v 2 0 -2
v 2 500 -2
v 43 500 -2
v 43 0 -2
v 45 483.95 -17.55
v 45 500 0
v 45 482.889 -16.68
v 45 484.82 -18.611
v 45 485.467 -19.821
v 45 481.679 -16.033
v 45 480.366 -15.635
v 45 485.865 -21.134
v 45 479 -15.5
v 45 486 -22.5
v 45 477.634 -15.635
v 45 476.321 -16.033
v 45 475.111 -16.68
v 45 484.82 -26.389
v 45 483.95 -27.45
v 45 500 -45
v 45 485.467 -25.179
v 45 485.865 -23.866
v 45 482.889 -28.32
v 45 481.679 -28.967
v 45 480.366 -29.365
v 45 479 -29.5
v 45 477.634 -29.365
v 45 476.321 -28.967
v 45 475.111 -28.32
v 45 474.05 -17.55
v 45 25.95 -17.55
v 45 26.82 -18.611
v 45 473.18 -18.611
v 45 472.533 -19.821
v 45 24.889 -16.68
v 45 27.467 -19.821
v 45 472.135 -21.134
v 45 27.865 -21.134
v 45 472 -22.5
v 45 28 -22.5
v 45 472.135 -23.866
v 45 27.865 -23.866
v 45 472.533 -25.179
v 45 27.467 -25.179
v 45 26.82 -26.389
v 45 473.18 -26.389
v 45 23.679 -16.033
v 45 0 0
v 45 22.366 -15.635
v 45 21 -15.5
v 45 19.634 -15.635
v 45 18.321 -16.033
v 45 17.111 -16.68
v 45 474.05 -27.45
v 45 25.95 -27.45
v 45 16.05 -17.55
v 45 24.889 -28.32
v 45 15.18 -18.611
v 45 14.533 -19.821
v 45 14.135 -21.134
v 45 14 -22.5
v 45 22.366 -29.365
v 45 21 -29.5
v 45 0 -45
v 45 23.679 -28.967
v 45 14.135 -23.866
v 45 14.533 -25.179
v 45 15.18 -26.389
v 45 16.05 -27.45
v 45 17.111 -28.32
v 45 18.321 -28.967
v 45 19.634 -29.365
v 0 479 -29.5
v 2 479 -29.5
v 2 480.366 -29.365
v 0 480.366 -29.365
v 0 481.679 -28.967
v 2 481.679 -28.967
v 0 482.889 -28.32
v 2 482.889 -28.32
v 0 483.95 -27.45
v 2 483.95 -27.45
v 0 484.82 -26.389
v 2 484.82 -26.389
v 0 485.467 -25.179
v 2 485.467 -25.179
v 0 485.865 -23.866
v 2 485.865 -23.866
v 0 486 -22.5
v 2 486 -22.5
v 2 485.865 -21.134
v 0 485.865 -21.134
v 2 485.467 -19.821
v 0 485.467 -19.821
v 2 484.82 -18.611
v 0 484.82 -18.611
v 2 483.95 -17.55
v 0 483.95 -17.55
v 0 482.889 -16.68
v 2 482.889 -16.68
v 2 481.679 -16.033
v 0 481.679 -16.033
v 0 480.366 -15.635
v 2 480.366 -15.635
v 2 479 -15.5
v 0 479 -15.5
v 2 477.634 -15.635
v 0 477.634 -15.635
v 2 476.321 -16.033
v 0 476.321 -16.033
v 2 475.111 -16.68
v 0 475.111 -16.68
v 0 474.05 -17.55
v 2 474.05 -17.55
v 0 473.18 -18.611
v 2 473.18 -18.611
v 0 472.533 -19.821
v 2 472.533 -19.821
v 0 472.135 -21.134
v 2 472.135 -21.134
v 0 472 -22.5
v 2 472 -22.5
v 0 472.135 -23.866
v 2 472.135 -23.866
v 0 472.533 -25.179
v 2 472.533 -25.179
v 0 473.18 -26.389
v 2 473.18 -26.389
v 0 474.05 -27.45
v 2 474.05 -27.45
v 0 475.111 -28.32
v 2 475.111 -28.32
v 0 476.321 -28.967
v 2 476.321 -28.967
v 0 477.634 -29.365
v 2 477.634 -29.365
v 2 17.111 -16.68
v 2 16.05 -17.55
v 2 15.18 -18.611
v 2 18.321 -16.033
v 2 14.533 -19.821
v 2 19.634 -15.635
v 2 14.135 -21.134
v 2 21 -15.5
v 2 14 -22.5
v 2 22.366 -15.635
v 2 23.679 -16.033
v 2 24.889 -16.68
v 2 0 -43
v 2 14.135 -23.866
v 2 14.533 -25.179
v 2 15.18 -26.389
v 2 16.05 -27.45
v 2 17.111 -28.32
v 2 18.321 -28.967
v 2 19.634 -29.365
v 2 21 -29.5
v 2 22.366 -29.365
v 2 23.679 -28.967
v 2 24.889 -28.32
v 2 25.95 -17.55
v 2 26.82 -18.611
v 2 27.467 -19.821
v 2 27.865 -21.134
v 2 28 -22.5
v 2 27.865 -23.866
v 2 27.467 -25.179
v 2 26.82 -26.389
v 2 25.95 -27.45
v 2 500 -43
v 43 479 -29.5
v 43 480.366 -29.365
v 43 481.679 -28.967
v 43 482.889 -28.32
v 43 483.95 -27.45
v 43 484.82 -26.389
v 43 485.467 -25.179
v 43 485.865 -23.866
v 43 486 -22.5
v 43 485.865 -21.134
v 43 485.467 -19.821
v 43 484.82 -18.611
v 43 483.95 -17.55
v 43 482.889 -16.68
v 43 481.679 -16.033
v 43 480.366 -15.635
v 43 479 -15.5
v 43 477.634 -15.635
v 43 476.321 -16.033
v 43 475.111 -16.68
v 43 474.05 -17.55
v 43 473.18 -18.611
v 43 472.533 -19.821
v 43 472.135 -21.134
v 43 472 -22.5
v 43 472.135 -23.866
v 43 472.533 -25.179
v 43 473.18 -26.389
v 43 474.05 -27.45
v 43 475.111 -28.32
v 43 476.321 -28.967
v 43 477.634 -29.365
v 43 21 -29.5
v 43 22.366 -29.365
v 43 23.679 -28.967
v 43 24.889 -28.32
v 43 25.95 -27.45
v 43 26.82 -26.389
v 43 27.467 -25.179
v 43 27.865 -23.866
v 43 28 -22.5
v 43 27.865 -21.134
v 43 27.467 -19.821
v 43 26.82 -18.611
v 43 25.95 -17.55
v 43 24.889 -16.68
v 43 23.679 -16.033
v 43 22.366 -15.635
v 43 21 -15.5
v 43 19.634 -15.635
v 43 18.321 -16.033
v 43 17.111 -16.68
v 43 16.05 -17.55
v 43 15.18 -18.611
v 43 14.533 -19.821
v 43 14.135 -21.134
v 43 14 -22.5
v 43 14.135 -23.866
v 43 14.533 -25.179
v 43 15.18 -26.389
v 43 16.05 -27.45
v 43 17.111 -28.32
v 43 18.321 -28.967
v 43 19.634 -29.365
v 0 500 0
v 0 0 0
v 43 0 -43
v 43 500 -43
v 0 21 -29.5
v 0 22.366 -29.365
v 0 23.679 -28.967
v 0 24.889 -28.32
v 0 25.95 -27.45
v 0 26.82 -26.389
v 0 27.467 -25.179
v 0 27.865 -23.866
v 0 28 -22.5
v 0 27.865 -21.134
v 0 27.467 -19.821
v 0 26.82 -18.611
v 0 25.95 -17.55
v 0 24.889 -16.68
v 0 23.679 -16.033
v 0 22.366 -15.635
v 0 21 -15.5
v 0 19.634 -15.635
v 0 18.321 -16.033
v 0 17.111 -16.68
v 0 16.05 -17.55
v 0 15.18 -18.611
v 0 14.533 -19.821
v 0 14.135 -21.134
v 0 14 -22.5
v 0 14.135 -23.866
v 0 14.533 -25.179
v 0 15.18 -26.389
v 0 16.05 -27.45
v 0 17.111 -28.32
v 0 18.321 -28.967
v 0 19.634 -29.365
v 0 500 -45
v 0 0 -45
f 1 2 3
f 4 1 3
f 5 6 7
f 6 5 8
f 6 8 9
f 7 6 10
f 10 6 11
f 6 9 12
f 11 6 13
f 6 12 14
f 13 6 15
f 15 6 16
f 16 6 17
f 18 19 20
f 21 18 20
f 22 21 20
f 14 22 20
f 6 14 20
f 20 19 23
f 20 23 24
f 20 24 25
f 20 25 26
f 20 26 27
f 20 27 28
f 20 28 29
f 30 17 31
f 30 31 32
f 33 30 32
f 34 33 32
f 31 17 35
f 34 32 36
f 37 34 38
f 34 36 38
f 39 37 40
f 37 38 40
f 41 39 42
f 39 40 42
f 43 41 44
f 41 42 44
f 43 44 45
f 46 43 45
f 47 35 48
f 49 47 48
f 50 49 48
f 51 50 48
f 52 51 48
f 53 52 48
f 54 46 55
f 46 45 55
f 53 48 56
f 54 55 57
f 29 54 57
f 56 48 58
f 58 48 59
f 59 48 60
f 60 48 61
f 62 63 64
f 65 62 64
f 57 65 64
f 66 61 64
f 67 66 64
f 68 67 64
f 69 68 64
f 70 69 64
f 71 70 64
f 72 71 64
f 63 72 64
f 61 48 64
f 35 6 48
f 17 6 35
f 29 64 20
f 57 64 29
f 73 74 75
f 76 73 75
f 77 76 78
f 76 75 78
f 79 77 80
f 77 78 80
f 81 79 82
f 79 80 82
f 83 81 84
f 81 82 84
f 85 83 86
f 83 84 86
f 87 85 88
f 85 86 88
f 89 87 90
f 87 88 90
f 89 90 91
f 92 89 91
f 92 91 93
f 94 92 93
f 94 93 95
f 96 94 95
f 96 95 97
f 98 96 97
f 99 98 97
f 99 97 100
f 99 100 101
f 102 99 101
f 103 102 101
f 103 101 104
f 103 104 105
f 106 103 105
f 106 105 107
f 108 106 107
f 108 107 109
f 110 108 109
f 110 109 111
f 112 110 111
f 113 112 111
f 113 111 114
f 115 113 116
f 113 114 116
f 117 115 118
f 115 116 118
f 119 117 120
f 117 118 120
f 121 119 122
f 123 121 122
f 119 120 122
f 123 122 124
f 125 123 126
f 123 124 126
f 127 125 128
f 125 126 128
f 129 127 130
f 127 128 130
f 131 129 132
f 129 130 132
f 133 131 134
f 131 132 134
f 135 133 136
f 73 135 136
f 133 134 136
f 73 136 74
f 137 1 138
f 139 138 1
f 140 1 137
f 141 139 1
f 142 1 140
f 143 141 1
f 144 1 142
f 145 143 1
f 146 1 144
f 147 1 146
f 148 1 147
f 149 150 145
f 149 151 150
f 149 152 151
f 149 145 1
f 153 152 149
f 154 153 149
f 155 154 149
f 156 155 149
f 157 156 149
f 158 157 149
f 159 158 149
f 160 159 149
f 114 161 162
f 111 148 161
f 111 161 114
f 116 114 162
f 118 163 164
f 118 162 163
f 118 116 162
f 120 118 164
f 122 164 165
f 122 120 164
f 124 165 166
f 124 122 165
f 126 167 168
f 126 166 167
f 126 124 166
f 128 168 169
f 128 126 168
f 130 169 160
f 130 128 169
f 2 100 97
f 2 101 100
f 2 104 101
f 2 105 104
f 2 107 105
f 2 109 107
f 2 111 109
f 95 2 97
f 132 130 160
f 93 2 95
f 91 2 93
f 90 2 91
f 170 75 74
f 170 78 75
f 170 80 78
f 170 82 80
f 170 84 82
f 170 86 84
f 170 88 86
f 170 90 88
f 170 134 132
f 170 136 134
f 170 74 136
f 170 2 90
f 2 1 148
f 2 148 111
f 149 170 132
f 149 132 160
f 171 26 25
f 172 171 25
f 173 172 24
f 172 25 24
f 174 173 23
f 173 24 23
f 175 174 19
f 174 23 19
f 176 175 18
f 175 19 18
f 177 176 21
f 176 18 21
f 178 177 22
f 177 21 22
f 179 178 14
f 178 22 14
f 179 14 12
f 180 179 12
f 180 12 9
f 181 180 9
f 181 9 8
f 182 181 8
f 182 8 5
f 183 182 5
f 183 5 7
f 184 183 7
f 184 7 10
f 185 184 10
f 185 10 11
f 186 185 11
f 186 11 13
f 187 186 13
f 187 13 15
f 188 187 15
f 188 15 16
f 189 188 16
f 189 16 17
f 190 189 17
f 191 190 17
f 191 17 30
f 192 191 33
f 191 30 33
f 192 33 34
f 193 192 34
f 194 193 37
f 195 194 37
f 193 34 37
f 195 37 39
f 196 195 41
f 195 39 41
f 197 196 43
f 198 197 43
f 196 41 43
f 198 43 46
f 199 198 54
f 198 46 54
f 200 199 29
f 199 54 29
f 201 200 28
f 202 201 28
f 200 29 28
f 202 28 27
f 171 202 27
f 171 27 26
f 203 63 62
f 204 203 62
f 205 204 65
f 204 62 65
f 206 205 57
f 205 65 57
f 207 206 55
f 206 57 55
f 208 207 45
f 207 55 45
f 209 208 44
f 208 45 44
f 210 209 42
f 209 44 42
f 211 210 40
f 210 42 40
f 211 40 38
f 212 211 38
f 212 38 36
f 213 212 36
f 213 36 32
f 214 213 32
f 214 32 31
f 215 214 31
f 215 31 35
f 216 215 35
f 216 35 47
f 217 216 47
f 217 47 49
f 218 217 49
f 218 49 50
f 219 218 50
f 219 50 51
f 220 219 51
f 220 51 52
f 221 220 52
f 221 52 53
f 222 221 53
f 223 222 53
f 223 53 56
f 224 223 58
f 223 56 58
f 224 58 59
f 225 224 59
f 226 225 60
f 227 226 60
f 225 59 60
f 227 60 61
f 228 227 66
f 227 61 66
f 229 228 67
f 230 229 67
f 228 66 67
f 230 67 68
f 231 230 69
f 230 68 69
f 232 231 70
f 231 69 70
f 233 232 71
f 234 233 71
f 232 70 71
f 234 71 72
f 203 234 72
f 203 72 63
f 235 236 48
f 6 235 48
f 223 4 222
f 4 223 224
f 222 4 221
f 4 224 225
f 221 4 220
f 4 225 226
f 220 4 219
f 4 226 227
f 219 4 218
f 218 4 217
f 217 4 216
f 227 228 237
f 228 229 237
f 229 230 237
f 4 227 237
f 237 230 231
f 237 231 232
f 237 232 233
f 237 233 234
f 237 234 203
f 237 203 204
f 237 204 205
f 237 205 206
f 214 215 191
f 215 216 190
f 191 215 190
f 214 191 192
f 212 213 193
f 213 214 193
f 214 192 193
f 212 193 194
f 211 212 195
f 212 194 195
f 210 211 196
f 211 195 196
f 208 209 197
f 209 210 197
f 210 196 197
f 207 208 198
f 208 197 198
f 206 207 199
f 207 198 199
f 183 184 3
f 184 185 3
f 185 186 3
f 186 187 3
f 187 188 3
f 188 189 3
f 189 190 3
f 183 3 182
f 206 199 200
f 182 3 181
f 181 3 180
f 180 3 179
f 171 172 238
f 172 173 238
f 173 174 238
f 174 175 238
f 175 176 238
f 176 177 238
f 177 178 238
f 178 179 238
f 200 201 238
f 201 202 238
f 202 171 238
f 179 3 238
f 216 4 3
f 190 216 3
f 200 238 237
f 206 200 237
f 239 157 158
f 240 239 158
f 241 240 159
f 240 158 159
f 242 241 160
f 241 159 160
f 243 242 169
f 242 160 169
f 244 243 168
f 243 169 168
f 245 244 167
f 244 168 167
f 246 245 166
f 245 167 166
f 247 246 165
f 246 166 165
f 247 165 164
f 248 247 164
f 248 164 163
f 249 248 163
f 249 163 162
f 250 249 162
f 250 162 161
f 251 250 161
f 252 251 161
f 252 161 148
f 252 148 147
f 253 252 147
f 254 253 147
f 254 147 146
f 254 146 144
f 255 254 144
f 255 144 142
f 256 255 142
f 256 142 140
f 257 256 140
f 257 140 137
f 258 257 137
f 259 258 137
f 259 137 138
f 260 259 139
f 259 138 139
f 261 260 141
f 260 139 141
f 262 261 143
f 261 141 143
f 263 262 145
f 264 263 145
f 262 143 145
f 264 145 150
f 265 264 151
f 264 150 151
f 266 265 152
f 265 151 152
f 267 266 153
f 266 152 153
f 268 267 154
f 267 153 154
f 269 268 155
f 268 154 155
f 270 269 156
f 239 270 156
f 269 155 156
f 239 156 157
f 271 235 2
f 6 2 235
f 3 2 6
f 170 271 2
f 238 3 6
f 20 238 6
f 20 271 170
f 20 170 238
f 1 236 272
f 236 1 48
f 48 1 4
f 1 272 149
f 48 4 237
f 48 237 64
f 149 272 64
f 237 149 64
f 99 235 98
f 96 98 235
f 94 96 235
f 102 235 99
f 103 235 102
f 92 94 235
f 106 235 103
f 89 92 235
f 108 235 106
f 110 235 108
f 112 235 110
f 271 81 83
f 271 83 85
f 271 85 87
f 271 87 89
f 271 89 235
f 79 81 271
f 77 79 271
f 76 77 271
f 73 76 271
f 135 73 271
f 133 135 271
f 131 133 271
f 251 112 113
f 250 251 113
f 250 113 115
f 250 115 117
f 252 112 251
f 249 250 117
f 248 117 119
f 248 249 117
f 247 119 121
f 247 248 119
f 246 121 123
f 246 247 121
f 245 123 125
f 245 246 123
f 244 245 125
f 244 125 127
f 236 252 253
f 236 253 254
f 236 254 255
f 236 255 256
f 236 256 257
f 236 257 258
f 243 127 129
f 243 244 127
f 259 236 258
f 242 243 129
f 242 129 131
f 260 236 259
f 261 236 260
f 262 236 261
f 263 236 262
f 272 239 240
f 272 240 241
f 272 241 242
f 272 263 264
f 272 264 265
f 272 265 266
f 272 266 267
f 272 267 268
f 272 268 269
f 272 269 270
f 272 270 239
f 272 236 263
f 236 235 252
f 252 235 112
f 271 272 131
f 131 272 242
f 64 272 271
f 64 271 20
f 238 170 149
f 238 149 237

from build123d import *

# Parameters (mm, degrees)
CROQUIS1_W              = 45
CROQUIS1_H              = 45
SALIENTE_EXTRUIR1_DEPTH = 500
CROQUIS2_W              = 41
CROQUIS2_H              = 41
CORTAR_EXTRUIR1_DEPTH   = 505.03372903
CROQUIS3_R              = 7
CORTAR_EXTRUIR2_DEPTH   = 505.03372903


with BuildPart() as part:
    # Croquis1 → Saliente-Extruir1 (new body)
    with BuildSketch(Plane(origin=(0, 0, 0), x_dir=(1, 0, 0), z_dir=(0, 1, 0))):
        with Locations((22.5, 22.5)):
            Rectangle(CROQUIS1_W, CROQUIS1_H)
    extrude(amount=SALIENTE_EXTRUIR1_DEPTH)

    # Croquis2 → Cortar-Extruir1 (cut, through all)
    with BuildSketch(Plane(origin=(0, 500, 0), x_dir=(1, 0, 0), z_dir=(0, 1, 0))):
        with Locations((22.5, 22.5)):
            Rectangle(CROQUIS2_W, CROQUIS2_H)
    extrude(amount=-CORTAR_EXTRUIR1_DEPTH, mode=Mode.SUBTRACT)

    # Croquis3 → Cortar-Extruir2 (cut, through all)
    with BuildSketch(Plane(origin=(45, 0, 0), x_dir=(0, 0, -1), z_dir=(1, 0, 0))):
        with Locations((22.5, 479)):
            Circle(CROQUIS3_R)
        with Locations((22.5, 21)):
            Circle(CROQUIS3_R)
    extrude(amount=-CORTAR_EXTRUIR2_DEPTH, mode=Mode.SUBTRACT)


solid = part.part
